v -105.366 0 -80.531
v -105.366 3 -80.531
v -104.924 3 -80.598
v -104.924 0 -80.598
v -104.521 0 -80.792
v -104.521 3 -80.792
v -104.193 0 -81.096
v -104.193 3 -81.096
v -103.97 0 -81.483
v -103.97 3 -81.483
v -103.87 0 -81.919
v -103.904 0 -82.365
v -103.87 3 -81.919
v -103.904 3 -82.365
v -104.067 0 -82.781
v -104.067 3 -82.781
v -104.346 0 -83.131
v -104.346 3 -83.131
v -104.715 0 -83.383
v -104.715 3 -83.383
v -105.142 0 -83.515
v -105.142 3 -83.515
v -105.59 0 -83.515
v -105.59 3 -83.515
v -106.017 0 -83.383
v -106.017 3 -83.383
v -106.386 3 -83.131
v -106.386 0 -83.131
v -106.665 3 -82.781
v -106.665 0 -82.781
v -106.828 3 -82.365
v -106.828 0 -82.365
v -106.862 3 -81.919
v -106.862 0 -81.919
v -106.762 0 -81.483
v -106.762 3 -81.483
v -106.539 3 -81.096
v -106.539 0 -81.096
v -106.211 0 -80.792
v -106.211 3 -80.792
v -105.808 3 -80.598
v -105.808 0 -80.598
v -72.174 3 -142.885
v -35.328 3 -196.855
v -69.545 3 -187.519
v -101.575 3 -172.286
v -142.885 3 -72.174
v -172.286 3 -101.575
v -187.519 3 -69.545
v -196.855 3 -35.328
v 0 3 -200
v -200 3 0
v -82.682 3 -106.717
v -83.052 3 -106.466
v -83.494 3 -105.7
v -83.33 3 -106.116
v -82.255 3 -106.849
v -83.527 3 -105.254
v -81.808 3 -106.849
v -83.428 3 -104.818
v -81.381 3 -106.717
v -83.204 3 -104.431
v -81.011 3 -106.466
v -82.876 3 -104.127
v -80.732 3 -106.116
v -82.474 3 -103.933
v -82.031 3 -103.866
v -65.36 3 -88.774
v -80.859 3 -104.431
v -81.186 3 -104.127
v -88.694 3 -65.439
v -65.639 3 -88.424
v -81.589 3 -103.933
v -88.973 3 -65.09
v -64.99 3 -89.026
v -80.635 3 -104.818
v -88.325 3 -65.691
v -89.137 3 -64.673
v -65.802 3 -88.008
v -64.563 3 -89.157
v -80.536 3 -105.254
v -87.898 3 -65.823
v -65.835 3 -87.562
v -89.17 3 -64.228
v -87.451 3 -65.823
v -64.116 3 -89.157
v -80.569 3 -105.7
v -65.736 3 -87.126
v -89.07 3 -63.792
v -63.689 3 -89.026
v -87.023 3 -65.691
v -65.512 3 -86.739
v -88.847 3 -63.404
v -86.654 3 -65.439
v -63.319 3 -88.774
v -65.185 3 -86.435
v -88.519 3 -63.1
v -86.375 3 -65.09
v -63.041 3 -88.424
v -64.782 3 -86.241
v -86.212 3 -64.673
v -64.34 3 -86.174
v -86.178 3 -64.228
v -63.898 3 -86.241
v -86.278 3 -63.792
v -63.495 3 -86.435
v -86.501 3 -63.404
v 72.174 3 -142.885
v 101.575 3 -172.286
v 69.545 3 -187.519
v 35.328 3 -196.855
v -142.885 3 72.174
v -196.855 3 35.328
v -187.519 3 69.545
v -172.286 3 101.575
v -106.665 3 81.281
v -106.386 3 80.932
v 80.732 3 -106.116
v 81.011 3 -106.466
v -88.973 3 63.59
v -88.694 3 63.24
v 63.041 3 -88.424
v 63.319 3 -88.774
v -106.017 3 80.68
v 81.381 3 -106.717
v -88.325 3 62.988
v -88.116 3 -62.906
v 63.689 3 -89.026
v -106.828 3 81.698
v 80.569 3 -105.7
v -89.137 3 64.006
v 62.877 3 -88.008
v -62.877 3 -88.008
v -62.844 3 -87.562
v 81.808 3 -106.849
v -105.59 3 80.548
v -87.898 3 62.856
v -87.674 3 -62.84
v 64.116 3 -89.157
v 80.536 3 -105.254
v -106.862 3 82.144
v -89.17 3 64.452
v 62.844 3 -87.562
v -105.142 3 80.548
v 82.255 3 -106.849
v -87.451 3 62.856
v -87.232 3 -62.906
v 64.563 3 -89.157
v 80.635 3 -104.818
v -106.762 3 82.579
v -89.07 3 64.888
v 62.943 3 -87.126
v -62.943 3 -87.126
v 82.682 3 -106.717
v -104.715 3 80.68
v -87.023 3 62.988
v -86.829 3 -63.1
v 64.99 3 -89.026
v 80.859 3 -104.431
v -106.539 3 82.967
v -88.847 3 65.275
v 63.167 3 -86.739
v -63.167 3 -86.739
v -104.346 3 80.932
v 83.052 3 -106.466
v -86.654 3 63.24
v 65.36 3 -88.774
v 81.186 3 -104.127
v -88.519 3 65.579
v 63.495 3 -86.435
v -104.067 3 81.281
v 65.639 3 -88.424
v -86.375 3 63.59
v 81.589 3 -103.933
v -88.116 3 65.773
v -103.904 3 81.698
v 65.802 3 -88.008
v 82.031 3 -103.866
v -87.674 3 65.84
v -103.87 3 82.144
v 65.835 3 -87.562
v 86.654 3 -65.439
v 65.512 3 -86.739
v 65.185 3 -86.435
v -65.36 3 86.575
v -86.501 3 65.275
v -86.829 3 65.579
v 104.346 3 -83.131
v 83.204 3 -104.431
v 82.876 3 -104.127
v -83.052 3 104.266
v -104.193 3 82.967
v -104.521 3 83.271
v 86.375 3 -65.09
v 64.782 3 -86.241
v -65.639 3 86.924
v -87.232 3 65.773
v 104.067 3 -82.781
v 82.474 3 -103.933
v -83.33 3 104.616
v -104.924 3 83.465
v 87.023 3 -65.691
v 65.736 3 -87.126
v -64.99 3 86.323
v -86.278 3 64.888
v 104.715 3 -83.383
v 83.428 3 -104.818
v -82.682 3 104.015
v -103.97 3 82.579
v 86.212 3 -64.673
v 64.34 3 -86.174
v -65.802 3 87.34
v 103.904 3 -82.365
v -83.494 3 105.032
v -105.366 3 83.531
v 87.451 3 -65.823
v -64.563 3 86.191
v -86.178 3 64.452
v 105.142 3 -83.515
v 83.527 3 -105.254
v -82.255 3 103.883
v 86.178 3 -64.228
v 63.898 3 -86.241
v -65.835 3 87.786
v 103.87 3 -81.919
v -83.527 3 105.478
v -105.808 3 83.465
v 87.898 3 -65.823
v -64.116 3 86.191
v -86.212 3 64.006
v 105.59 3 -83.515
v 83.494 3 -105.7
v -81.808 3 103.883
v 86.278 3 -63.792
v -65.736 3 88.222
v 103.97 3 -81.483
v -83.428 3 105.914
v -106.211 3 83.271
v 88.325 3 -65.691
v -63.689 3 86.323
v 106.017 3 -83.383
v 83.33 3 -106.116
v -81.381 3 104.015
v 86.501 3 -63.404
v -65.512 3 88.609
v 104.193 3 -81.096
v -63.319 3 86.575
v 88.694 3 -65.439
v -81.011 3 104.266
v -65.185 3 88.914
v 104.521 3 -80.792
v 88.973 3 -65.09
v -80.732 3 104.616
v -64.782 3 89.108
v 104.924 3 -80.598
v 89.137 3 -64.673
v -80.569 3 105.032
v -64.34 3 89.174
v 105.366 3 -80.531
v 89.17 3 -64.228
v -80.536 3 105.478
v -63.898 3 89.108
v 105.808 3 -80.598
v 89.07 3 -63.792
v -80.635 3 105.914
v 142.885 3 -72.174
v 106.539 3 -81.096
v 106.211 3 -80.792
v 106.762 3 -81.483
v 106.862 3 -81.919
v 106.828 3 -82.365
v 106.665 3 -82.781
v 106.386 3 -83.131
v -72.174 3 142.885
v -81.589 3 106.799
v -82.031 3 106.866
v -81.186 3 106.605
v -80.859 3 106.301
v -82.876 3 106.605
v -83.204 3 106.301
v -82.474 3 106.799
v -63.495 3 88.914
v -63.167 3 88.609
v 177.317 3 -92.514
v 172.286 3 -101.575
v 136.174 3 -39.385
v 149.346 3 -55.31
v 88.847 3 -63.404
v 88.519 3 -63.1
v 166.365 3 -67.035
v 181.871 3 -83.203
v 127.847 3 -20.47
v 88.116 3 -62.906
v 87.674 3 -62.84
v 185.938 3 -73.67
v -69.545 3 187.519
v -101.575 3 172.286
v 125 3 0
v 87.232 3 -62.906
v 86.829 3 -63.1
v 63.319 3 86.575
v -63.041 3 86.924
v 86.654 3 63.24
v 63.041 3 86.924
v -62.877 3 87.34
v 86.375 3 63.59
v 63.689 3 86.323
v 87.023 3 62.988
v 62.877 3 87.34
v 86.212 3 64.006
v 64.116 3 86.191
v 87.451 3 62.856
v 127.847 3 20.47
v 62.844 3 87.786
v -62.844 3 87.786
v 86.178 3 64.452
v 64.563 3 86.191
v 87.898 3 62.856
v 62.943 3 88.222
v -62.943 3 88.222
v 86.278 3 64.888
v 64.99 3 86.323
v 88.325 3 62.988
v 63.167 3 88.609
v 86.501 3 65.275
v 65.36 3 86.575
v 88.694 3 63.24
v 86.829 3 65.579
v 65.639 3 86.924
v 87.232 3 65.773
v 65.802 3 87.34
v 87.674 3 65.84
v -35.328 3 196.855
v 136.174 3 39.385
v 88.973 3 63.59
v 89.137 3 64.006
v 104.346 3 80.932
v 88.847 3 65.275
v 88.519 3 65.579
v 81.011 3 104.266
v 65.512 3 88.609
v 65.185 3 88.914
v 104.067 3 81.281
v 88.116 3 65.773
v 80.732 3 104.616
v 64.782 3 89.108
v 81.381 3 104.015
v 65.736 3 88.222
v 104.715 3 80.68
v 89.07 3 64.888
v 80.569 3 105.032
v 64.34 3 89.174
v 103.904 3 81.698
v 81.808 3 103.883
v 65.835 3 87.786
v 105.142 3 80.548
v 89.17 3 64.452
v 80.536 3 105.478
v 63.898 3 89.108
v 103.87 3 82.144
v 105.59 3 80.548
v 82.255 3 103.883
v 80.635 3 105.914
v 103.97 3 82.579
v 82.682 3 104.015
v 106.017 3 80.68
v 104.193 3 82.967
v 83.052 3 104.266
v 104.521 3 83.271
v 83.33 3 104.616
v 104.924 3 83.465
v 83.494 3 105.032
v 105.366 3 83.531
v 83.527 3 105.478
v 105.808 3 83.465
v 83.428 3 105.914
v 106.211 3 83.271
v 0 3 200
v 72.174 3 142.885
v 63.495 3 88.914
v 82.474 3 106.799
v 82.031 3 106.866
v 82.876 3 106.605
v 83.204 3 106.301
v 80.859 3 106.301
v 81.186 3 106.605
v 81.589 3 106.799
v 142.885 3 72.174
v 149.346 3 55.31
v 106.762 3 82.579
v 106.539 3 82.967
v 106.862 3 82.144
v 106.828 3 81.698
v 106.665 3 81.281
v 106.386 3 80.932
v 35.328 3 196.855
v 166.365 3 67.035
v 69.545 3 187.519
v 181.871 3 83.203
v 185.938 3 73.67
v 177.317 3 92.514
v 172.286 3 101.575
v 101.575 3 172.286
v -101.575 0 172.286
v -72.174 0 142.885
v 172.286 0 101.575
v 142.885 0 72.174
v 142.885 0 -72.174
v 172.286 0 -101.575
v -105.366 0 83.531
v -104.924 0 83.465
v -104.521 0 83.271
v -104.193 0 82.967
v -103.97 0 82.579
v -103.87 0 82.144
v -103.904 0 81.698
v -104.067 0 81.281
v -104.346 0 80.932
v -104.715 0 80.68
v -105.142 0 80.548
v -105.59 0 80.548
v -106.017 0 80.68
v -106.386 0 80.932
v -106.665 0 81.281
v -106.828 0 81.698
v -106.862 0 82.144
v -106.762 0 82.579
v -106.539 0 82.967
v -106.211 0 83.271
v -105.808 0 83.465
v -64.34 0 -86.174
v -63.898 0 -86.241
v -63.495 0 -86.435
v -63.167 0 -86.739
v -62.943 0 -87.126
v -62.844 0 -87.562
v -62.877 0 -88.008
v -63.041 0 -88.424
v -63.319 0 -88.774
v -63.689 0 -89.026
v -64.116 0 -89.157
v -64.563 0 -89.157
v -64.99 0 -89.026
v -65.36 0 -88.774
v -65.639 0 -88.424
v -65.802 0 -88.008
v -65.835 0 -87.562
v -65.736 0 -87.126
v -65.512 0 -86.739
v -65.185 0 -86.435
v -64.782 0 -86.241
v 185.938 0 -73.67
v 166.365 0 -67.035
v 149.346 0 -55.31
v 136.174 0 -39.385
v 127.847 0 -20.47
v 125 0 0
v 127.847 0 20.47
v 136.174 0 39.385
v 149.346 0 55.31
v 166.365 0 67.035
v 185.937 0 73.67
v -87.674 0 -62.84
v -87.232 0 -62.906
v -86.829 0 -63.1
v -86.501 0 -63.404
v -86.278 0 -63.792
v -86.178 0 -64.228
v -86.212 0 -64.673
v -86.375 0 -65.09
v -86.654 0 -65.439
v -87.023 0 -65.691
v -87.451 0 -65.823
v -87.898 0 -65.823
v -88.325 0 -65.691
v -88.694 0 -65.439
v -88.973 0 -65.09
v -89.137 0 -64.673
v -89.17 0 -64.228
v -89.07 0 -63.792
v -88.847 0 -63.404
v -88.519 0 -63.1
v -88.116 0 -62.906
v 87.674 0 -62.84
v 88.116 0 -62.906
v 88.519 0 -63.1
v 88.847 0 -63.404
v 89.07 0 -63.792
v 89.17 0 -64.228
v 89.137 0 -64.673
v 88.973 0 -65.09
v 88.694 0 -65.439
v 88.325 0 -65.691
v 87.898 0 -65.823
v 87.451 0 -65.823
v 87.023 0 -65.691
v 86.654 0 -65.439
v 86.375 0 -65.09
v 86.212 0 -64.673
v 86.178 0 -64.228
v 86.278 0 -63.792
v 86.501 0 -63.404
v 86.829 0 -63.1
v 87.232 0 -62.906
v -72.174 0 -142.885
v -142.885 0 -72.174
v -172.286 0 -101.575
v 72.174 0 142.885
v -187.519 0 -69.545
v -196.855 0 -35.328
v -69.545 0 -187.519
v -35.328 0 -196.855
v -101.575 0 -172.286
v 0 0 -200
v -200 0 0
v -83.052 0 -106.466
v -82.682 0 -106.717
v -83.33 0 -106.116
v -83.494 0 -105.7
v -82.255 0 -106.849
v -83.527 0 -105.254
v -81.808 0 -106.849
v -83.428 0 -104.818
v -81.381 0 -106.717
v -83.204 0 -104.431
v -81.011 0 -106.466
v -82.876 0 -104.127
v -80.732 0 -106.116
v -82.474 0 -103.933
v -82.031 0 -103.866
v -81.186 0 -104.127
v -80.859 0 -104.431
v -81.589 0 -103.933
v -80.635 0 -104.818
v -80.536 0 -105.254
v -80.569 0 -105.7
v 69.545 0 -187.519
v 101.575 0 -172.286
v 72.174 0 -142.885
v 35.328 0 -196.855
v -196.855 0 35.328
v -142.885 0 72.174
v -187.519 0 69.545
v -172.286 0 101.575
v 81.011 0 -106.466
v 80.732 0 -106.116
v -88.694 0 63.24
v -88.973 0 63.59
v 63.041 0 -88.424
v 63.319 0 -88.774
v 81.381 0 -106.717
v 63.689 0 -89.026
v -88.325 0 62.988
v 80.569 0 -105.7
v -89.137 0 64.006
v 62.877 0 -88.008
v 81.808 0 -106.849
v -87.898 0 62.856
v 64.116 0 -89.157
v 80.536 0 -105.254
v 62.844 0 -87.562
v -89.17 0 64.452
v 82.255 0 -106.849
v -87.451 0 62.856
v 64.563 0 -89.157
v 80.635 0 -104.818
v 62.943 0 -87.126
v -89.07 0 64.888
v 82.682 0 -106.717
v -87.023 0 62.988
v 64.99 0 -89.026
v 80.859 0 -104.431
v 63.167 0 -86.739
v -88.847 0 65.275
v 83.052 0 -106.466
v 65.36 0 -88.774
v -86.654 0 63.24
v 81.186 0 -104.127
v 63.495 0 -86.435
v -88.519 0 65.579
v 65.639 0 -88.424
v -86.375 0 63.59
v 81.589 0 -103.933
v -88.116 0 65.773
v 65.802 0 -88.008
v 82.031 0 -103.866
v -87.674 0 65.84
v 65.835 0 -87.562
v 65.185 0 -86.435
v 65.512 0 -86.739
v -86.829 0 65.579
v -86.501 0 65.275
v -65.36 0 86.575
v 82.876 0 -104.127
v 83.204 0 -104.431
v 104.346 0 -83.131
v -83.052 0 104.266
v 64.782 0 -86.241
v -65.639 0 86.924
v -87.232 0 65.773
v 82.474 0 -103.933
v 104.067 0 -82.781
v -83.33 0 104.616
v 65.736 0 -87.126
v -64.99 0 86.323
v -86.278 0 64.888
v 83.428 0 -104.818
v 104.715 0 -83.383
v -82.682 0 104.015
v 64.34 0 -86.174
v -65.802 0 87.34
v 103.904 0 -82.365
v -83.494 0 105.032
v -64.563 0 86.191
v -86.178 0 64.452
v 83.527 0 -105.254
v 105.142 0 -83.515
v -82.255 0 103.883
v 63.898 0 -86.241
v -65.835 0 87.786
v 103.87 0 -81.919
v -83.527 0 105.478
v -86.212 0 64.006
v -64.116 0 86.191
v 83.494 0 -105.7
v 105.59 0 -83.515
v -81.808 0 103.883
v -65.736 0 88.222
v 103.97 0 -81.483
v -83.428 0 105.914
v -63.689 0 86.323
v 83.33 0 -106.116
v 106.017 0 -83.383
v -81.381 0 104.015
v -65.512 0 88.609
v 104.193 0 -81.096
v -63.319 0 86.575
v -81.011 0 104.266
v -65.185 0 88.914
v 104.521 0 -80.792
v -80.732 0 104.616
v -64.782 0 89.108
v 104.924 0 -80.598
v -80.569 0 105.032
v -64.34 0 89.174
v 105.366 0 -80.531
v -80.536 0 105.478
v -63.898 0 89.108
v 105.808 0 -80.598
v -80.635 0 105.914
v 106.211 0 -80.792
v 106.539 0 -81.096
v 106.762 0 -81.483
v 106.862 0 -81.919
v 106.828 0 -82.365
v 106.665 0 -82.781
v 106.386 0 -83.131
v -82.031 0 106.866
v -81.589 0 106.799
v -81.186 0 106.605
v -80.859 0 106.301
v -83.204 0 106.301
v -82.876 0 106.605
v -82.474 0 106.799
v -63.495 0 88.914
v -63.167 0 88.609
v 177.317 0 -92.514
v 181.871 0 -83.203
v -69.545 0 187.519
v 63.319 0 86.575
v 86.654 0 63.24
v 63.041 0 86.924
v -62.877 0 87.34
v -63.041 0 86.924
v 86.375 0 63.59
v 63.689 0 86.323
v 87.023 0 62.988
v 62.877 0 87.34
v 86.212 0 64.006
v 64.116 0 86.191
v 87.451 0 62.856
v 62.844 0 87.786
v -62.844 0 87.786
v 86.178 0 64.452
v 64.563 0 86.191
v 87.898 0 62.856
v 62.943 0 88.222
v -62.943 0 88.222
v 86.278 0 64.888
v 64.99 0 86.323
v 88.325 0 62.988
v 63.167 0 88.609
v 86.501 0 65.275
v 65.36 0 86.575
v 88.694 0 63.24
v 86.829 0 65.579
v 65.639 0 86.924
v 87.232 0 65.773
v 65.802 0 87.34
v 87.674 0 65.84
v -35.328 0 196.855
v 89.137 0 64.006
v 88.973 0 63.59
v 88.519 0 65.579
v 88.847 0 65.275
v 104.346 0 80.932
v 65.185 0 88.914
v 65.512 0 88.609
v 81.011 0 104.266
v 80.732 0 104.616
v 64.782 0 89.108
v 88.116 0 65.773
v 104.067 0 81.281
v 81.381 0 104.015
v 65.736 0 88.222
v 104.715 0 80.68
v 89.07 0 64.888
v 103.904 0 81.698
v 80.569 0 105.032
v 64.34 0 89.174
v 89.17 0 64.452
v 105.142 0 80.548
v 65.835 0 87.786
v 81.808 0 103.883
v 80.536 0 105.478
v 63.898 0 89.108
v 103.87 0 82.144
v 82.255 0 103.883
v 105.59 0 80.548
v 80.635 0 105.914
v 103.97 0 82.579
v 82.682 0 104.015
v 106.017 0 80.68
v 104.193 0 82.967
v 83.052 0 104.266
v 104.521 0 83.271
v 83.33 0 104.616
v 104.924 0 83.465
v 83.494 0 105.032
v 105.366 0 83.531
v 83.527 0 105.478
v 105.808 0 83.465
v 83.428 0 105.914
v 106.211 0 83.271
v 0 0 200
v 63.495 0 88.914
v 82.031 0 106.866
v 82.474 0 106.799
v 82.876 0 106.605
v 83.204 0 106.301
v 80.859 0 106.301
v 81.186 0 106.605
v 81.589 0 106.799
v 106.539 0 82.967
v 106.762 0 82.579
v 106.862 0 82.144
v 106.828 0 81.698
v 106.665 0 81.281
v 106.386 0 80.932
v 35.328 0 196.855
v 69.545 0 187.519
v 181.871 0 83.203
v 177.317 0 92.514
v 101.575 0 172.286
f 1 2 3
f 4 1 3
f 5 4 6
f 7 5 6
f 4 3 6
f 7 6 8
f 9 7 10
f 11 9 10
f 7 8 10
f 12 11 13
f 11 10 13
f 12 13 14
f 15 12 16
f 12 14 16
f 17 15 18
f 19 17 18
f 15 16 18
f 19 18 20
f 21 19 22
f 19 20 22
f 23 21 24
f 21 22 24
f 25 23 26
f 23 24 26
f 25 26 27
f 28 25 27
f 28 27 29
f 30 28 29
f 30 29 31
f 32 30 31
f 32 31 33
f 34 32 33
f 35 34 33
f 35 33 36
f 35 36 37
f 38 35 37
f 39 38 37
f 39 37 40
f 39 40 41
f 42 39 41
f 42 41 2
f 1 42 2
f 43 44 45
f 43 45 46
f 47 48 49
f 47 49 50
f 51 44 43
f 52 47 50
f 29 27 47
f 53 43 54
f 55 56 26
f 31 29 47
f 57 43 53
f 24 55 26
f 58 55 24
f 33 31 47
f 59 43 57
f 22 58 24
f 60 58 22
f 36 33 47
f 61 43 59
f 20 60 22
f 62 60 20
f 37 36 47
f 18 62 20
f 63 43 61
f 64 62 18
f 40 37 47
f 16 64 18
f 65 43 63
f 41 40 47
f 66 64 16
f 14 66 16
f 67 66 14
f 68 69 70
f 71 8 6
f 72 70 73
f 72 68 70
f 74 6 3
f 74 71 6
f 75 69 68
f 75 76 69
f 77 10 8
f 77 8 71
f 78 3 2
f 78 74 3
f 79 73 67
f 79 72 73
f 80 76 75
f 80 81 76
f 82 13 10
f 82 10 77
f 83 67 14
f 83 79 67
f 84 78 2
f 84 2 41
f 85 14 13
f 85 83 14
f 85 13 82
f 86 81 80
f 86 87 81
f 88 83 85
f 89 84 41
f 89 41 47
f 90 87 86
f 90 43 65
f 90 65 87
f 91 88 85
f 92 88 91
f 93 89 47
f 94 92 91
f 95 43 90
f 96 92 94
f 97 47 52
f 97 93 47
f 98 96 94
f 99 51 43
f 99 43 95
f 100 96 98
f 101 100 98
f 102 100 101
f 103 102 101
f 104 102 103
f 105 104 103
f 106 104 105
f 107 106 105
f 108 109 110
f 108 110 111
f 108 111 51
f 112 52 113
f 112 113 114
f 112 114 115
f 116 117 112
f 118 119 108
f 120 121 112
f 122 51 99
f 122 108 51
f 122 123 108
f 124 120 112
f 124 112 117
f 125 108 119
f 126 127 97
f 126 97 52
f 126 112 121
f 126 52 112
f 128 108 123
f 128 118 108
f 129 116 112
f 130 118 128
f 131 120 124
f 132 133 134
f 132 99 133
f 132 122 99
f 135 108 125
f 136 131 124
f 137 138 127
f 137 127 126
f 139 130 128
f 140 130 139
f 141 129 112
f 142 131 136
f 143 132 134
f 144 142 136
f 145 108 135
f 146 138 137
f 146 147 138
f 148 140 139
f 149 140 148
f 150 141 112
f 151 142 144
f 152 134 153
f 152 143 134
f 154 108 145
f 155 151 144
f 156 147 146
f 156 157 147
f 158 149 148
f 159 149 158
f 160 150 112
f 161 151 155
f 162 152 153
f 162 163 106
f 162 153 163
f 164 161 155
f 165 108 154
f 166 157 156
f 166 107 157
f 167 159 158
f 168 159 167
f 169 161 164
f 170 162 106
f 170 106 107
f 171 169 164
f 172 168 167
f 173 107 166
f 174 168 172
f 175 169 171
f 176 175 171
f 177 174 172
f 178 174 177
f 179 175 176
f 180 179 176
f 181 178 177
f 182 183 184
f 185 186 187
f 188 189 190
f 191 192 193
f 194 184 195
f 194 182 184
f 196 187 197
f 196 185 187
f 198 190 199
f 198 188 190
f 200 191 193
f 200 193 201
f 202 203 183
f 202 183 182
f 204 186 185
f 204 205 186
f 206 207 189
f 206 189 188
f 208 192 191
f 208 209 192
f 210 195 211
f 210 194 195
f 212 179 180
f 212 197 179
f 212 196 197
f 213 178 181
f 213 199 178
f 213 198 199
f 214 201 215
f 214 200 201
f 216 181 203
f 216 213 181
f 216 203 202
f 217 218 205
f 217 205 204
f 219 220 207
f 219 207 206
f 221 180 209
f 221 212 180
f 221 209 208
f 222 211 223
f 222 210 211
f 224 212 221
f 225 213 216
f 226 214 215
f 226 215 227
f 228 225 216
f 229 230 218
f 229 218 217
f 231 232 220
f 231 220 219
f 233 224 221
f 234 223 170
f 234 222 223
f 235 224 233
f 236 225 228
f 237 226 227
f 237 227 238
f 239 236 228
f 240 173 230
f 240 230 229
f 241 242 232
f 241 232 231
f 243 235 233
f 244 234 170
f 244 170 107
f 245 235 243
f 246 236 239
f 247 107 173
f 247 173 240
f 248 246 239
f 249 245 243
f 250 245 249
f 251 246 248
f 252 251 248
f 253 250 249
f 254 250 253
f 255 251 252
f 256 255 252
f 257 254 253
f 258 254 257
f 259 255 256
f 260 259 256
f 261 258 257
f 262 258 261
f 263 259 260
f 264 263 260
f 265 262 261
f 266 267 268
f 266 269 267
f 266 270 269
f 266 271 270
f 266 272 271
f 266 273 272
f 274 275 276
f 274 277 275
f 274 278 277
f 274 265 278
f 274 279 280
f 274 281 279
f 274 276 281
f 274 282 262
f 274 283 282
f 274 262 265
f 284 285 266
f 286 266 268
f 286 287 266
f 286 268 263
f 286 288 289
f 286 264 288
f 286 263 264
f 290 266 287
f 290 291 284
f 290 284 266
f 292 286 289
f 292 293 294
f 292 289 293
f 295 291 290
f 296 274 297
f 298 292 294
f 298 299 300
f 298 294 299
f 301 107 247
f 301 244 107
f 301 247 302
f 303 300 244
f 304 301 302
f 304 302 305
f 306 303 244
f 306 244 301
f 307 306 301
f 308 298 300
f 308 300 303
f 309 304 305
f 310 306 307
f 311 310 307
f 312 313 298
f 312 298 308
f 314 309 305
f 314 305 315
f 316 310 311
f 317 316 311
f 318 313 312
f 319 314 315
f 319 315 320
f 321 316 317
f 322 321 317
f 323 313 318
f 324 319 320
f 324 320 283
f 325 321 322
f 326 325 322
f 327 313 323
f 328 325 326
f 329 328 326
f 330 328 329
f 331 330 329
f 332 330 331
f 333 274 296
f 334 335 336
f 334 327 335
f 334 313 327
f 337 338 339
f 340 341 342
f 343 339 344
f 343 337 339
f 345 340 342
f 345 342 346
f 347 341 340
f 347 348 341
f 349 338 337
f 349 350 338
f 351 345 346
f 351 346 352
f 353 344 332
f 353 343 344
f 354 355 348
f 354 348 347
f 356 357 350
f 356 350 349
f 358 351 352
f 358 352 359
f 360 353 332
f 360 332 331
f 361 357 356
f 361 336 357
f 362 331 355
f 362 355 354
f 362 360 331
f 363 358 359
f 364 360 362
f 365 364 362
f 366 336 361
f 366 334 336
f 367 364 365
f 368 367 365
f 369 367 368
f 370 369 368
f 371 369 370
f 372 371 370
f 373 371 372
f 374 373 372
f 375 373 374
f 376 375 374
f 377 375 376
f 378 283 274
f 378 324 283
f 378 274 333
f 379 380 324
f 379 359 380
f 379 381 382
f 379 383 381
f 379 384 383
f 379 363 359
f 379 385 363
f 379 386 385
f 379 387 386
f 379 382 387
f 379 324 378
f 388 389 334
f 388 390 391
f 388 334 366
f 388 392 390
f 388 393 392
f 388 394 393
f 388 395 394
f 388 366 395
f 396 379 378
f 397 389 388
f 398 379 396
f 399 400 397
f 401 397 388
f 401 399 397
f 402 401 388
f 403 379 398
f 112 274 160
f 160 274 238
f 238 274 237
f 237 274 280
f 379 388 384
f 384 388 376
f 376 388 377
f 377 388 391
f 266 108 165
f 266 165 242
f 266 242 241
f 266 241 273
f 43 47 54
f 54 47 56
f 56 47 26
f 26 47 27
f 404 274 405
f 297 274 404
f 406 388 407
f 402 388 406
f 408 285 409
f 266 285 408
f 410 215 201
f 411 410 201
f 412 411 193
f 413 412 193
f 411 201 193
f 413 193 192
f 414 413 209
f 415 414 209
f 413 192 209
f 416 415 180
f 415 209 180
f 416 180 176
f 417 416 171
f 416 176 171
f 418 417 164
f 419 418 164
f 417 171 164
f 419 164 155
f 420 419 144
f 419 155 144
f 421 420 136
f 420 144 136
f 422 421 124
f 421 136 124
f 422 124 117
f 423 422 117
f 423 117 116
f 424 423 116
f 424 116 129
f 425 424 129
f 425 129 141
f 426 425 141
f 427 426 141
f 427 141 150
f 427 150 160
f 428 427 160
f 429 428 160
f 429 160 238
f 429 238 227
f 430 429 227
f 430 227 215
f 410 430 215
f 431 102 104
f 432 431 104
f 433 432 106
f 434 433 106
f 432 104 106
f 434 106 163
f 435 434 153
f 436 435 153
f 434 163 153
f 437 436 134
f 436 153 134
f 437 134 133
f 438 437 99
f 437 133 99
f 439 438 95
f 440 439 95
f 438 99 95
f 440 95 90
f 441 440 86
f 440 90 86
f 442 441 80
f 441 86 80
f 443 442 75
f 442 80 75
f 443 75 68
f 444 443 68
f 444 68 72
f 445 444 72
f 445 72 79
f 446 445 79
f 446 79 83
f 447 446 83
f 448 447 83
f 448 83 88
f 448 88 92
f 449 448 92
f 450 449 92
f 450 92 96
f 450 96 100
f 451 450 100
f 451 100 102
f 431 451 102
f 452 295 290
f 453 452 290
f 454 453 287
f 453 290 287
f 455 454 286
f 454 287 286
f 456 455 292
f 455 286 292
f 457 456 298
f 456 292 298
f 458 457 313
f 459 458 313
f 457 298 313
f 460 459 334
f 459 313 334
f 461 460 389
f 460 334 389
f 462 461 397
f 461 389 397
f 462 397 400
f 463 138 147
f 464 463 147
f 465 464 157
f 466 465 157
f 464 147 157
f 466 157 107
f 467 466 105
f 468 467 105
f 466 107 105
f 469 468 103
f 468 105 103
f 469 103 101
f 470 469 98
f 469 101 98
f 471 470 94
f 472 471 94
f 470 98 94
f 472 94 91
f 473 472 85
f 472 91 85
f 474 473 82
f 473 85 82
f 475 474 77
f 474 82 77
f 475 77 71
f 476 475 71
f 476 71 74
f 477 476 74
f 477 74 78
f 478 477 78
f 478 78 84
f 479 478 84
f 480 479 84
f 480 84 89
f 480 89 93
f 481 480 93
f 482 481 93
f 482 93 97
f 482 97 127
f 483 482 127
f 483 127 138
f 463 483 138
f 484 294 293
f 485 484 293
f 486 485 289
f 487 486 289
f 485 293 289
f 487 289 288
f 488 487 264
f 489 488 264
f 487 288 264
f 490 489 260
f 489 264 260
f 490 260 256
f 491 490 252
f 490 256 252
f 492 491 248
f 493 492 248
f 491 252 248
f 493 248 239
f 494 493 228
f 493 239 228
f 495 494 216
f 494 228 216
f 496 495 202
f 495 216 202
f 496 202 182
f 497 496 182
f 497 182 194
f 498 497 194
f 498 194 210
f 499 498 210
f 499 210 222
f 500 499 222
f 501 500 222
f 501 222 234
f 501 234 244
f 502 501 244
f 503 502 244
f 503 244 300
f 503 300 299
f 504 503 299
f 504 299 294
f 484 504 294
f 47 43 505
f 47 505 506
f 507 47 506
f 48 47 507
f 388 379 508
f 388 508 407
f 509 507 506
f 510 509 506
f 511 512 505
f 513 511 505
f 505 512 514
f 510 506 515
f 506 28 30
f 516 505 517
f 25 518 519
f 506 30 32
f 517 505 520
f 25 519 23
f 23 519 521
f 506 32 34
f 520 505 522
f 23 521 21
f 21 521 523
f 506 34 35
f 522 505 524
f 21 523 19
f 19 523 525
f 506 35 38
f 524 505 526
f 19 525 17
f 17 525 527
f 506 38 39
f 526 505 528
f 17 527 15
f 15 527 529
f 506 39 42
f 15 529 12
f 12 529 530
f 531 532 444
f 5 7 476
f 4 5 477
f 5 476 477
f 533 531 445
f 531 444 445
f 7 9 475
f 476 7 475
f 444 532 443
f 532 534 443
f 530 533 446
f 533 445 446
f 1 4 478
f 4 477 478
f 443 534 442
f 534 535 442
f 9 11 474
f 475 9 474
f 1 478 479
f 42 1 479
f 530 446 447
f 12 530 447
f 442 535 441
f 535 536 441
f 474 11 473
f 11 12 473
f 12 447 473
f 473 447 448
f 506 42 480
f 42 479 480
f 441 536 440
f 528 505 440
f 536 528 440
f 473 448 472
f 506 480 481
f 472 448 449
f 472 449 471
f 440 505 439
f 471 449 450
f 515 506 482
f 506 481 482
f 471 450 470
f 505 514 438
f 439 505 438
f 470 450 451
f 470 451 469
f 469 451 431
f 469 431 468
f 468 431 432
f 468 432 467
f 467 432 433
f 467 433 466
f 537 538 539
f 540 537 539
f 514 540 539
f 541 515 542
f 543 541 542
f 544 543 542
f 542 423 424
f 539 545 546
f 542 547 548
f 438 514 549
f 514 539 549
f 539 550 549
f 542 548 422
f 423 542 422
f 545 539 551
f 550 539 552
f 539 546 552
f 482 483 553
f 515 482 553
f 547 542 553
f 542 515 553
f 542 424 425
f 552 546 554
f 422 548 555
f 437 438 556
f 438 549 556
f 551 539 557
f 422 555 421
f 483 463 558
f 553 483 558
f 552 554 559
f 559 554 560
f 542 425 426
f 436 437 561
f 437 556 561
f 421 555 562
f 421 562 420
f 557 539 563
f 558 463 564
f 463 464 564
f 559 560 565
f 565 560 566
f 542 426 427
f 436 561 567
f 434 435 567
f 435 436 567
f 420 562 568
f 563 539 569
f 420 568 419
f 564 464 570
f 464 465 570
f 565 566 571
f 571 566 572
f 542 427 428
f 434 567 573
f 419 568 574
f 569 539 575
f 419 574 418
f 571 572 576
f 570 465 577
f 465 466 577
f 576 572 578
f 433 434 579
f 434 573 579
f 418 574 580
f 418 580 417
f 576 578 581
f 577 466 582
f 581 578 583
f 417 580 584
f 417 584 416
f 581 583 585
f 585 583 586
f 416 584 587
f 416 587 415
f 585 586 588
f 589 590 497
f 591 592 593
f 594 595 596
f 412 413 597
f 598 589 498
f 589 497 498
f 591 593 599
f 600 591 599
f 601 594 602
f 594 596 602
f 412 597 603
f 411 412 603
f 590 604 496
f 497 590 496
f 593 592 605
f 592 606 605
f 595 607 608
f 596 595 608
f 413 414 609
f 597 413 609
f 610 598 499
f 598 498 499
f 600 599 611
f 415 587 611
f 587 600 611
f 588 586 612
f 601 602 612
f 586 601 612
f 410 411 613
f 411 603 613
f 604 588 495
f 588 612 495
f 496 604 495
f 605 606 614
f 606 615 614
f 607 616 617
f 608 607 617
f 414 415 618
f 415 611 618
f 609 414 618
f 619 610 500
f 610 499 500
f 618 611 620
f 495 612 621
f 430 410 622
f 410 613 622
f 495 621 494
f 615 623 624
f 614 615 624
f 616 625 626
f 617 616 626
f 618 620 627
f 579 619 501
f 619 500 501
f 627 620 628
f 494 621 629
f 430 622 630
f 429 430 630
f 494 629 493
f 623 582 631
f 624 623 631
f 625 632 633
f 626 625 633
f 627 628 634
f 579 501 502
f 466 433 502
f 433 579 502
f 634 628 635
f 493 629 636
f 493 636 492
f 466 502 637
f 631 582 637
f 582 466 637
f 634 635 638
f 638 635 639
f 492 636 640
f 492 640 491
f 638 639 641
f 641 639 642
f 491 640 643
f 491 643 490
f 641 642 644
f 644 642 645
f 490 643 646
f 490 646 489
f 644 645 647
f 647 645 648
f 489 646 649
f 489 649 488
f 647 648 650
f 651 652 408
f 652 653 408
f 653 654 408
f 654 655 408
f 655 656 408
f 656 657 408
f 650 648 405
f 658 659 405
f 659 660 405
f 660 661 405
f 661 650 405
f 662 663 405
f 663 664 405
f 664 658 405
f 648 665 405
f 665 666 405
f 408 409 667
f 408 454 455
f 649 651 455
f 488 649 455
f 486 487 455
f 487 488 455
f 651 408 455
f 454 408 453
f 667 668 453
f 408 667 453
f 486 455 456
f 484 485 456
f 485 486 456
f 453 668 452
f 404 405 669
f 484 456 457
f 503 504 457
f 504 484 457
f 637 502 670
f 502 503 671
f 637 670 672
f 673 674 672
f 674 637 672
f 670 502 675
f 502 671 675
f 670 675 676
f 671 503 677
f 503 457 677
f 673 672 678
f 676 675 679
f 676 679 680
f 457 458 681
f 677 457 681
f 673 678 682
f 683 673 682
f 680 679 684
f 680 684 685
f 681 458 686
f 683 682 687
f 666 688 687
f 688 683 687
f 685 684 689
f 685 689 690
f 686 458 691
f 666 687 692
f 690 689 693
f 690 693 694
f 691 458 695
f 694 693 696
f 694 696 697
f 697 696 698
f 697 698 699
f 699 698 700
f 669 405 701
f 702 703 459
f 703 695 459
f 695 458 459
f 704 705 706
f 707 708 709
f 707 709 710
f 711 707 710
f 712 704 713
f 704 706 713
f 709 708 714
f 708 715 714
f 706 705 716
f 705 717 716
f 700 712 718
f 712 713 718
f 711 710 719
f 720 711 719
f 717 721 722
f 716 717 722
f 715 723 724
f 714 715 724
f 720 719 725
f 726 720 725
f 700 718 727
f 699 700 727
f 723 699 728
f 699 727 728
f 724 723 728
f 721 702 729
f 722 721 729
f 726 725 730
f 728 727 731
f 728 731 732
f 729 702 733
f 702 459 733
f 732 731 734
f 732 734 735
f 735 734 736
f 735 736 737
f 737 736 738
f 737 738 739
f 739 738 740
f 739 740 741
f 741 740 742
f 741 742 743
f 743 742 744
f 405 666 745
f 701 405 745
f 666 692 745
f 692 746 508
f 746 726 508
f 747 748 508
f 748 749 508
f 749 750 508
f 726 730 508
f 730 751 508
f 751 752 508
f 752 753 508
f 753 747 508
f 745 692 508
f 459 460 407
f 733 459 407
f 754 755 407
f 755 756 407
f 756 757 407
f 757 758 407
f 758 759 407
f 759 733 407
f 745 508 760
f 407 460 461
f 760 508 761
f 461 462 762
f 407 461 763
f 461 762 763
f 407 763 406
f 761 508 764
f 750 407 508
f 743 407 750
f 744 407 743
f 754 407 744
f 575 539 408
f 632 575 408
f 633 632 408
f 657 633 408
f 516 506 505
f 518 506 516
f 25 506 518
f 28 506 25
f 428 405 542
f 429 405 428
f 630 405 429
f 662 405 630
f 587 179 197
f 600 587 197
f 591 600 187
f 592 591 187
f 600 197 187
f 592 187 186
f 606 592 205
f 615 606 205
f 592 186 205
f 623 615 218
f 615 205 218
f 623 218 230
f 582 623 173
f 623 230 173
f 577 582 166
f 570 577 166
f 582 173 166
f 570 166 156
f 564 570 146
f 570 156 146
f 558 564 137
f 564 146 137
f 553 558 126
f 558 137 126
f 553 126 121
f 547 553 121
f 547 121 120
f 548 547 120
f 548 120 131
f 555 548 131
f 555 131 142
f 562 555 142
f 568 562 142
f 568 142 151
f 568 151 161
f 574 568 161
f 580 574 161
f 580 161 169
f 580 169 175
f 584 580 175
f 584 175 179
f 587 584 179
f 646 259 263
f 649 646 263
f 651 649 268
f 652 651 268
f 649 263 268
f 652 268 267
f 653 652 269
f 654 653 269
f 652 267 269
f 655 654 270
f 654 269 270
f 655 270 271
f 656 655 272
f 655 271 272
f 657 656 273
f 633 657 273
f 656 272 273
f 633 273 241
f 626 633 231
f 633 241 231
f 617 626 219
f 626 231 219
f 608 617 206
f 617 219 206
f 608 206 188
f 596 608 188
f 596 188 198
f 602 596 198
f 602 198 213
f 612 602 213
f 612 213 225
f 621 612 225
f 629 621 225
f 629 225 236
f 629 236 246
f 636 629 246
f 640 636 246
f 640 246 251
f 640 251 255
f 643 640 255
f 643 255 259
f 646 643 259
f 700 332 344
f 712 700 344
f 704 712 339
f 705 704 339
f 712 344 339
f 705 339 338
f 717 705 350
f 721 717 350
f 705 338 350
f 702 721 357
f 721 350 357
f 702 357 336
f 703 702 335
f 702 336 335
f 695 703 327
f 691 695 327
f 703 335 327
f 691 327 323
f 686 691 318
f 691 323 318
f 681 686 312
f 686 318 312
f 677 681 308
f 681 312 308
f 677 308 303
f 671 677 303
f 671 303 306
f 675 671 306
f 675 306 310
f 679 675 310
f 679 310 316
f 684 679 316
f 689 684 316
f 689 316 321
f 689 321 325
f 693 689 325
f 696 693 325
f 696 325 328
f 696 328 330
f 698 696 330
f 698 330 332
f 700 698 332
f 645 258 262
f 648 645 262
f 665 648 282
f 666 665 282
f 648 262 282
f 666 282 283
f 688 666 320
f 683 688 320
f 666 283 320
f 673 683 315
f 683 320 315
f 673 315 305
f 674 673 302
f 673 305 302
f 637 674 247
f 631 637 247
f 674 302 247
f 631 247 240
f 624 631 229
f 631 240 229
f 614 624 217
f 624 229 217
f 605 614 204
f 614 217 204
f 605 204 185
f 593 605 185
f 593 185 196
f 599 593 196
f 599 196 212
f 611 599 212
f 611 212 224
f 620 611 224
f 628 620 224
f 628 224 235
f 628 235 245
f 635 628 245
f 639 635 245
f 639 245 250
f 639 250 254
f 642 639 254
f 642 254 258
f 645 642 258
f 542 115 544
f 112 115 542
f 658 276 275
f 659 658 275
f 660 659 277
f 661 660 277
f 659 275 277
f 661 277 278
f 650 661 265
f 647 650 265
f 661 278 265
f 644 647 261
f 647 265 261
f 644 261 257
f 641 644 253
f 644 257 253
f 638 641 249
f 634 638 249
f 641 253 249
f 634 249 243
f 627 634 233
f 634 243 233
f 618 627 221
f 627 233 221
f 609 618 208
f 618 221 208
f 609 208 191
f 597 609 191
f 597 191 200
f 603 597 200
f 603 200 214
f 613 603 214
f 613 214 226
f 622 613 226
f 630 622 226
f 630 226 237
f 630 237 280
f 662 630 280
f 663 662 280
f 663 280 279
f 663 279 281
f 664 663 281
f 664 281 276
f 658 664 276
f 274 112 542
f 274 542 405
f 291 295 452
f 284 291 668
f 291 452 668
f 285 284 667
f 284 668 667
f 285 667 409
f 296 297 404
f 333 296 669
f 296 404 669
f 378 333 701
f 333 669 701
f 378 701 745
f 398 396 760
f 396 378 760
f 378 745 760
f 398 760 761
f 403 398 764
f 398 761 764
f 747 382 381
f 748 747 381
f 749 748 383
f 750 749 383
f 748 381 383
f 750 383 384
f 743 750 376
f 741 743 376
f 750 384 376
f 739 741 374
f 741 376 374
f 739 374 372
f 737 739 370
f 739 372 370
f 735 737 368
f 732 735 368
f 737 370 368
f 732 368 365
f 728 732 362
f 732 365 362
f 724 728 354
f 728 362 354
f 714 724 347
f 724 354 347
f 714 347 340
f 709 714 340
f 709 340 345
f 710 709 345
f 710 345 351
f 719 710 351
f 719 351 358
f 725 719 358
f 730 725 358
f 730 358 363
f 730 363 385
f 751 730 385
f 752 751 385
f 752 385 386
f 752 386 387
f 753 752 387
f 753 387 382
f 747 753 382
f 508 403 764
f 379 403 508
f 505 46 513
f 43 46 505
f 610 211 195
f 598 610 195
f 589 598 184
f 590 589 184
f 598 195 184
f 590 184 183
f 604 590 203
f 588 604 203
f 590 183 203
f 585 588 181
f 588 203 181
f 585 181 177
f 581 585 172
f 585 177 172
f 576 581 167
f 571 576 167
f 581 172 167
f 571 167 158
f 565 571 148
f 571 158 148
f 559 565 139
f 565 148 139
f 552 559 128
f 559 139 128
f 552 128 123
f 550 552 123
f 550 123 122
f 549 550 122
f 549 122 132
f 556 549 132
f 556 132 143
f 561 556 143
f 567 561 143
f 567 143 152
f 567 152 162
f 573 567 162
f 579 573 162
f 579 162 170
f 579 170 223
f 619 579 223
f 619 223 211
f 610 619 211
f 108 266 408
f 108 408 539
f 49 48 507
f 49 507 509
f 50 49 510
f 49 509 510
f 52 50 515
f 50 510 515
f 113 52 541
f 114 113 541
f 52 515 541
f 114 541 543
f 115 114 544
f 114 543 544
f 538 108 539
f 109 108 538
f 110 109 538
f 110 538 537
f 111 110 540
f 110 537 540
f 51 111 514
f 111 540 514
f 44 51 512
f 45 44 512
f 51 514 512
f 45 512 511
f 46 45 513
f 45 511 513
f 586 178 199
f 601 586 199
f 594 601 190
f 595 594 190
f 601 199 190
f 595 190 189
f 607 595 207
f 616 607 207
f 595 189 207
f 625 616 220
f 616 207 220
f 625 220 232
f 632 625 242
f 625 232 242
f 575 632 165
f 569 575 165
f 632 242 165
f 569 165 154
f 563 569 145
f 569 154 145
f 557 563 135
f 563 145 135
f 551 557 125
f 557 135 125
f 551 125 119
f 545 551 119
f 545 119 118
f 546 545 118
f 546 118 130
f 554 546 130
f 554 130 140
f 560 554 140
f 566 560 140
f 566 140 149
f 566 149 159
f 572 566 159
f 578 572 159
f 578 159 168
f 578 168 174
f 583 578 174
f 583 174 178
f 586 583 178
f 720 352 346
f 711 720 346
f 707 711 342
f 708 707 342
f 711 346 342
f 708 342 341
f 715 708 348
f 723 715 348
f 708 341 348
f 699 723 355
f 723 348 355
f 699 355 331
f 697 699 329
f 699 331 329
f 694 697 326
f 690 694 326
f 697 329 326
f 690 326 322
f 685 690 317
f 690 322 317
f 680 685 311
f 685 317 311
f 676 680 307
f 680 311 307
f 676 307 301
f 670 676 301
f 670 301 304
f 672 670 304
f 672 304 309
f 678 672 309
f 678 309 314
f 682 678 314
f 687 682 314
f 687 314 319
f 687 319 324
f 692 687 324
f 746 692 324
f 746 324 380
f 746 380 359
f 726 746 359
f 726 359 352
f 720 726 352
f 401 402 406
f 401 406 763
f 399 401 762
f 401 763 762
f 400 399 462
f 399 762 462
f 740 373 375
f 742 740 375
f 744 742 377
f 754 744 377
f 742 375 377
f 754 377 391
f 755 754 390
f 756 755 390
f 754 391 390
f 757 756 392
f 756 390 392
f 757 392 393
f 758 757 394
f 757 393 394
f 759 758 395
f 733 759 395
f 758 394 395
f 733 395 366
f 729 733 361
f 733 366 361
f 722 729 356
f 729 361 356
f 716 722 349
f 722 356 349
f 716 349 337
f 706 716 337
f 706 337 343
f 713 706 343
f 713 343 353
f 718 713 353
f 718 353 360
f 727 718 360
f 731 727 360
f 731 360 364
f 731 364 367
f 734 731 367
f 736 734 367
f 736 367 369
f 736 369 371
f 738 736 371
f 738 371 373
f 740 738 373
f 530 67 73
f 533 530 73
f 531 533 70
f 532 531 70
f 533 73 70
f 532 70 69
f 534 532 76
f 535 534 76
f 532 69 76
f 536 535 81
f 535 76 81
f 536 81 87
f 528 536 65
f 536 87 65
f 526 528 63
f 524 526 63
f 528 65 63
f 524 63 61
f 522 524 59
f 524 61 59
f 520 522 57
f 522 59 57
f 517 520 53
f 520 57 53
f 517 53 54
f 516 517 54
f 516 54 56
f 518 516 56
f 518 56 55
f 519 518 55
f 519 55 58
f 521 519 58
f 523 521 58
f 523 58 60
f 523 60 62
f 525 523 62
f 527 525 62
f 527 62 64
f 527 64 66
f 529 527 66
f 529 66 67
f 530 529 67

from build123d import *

# Parameters (mm, degrees)
SKETCH1_R           = 200
BOSS_EXTRUDE1_DEPTH = 3
CUT_EXTRUDE1_DEPTH  = 3
SKETCH3_R           = 75
CUT_EXTRUDE2_DEPTH  = 10
SKETCH5_R           = 1.5
CUT_EXTRUDE4_DEPTH  = 73


with BuildPart() as part:
    # Sketch1 → Boss-Extrude1 (new body)
    with BuildSketch(Plane(origin=(0, 0, 0), x_dir=(1, 0, 0), z_dir=(0, 1, 0))):
        with Locations(Location((0, 0, 0), (0, 0, 270))):
            Circle(SKETCH1_R)
    extrude(amount=BOSS_EXTRUDE1_DEPTH)

    # Sketch2 → Cut-Extrude1 (cut)
    with BuildSketch(Plane(origin=(0, 3, 0), x_dir=(1, 0, 0), z_dir=(0, 1, 0))):
        Polygon((-142.885155346, -72.174477228), (-72.174477228, -142.885155346), (-156.069019709, -226.779697828), (-226.779697828, -156.069019709), align=None)
        Polygon((-72.174477228, 142.885155346), (-142.885155346, 72.174477228), (-226.779697828, 156.069019709), (-156.069019709, 226.779697828), align=None)
        Polygon((142.885155346, 72.174477228), (72.174477228, 142.885155346), (156.069019709, 226.779697828), (226.779697828, 156.069019709), align=None)
        Polygon((72.174477228, -142.885155346), (142.885155346, -72.174477228), (226.779697828, -156.069019709), (156.069019709, -226.779697828), align=None)
    extrude(amount=-CUT_EXTRUDE1_DEPTH, mode=Mode.SUBTRACT)

    # Sketch3 → Cut-Extrude2 (cut)
    with BuildSketch(Plane(origin=(0, 3, 0), x_dir=(1, 0, 0), z_dir=(0, 1, 0))):
        with Locations((200, 0)):
            Circle(SKETCH3_R)
    extrude(amount=-CUT_EXTRUDE2_DEPTH, mode=Mode.SUBTRACT)

    # Sketch5 → Cut-Extrude4 (cut)
    with BuildSketch(Plane(origin=(0, 3, 0), x_dir=(1, 0, 0), z_dir=(0, 1, 0))):
        with Locations(Location((82.031457685, -105.365981465, 0), (0, 0, 270))):
            Circle(SKETCH5_R)
        with Locations(Location((64.33964602, -87.674169799, 0), (0, 0, 270))):
            Circle(SKETCH5_R)
        with Locations(Location((105.365981465, -82.031457685, 0), (0, 0, 270))):
            Circle(SKETCH5_R)
        with Locations(Location((87.674169799, -64.33964602, 0), (0, 0, 270))):
            Circle(SKETCH5_R)
        with Locations(Location((-87.674169799, -64.33964602, 0), (0, 0, 270))):
            Circle(SKETCH5_R)
        with Locations(Location((-105.365981465, -82.031457685, 0), (0, 0, 270))):
            Circle(SKETCH5_R)
        with Locations(Location((-82.031457685, -105.365981465, 0), (0, 0, 270))):
            Circle(SKETCH5_R)
        with Locations(Location((-64.33964602, -87.674169799, 0), (0, 0, 270))):
            Circle(SKETCH5_R)
        with Locations(Location((-64.33964602, 87.674169799, 0), (0, 0, 270))):
            Circle(SKETCH5_R)
        with Locations(Location((-82.031457685, 105.365981465, 0), (0, 0, 270))):
            Circle(SKETCH5_R)
        with Locations(Location((-105.365981465, 82.031457685, 0), (0, 0, 270))):
            Circle(SKETCH5_R)
        with Locations(Location((-87.674169799, 64.33964602, 0), (0, 0, 270))):
            Circle(SKETCH5_R)
        with Locations(Location((87.674169799, 64.33964602, 0), (0, 0, 270))):
            Circle(SKETCH5_R)
        with Locations(Location((105.365981465, 82.031457685, 0), (0, 0, 270))):
            Circle(SKETCH5_R)
        with Locations(Location((82.031457685, 105.365981465, 0), (0, 0, 270))):
            Circle(SKETCH5_R)
        with Locations(Location((64.33964602, 87.674169799, 0), (0, 0, 270))):
            Circle(SKETCH5_R)
    extrude(amount=-CUT_EXTRUDE4_DEPTH, mode=Mode.SUBTRACT)


solid = part.part
